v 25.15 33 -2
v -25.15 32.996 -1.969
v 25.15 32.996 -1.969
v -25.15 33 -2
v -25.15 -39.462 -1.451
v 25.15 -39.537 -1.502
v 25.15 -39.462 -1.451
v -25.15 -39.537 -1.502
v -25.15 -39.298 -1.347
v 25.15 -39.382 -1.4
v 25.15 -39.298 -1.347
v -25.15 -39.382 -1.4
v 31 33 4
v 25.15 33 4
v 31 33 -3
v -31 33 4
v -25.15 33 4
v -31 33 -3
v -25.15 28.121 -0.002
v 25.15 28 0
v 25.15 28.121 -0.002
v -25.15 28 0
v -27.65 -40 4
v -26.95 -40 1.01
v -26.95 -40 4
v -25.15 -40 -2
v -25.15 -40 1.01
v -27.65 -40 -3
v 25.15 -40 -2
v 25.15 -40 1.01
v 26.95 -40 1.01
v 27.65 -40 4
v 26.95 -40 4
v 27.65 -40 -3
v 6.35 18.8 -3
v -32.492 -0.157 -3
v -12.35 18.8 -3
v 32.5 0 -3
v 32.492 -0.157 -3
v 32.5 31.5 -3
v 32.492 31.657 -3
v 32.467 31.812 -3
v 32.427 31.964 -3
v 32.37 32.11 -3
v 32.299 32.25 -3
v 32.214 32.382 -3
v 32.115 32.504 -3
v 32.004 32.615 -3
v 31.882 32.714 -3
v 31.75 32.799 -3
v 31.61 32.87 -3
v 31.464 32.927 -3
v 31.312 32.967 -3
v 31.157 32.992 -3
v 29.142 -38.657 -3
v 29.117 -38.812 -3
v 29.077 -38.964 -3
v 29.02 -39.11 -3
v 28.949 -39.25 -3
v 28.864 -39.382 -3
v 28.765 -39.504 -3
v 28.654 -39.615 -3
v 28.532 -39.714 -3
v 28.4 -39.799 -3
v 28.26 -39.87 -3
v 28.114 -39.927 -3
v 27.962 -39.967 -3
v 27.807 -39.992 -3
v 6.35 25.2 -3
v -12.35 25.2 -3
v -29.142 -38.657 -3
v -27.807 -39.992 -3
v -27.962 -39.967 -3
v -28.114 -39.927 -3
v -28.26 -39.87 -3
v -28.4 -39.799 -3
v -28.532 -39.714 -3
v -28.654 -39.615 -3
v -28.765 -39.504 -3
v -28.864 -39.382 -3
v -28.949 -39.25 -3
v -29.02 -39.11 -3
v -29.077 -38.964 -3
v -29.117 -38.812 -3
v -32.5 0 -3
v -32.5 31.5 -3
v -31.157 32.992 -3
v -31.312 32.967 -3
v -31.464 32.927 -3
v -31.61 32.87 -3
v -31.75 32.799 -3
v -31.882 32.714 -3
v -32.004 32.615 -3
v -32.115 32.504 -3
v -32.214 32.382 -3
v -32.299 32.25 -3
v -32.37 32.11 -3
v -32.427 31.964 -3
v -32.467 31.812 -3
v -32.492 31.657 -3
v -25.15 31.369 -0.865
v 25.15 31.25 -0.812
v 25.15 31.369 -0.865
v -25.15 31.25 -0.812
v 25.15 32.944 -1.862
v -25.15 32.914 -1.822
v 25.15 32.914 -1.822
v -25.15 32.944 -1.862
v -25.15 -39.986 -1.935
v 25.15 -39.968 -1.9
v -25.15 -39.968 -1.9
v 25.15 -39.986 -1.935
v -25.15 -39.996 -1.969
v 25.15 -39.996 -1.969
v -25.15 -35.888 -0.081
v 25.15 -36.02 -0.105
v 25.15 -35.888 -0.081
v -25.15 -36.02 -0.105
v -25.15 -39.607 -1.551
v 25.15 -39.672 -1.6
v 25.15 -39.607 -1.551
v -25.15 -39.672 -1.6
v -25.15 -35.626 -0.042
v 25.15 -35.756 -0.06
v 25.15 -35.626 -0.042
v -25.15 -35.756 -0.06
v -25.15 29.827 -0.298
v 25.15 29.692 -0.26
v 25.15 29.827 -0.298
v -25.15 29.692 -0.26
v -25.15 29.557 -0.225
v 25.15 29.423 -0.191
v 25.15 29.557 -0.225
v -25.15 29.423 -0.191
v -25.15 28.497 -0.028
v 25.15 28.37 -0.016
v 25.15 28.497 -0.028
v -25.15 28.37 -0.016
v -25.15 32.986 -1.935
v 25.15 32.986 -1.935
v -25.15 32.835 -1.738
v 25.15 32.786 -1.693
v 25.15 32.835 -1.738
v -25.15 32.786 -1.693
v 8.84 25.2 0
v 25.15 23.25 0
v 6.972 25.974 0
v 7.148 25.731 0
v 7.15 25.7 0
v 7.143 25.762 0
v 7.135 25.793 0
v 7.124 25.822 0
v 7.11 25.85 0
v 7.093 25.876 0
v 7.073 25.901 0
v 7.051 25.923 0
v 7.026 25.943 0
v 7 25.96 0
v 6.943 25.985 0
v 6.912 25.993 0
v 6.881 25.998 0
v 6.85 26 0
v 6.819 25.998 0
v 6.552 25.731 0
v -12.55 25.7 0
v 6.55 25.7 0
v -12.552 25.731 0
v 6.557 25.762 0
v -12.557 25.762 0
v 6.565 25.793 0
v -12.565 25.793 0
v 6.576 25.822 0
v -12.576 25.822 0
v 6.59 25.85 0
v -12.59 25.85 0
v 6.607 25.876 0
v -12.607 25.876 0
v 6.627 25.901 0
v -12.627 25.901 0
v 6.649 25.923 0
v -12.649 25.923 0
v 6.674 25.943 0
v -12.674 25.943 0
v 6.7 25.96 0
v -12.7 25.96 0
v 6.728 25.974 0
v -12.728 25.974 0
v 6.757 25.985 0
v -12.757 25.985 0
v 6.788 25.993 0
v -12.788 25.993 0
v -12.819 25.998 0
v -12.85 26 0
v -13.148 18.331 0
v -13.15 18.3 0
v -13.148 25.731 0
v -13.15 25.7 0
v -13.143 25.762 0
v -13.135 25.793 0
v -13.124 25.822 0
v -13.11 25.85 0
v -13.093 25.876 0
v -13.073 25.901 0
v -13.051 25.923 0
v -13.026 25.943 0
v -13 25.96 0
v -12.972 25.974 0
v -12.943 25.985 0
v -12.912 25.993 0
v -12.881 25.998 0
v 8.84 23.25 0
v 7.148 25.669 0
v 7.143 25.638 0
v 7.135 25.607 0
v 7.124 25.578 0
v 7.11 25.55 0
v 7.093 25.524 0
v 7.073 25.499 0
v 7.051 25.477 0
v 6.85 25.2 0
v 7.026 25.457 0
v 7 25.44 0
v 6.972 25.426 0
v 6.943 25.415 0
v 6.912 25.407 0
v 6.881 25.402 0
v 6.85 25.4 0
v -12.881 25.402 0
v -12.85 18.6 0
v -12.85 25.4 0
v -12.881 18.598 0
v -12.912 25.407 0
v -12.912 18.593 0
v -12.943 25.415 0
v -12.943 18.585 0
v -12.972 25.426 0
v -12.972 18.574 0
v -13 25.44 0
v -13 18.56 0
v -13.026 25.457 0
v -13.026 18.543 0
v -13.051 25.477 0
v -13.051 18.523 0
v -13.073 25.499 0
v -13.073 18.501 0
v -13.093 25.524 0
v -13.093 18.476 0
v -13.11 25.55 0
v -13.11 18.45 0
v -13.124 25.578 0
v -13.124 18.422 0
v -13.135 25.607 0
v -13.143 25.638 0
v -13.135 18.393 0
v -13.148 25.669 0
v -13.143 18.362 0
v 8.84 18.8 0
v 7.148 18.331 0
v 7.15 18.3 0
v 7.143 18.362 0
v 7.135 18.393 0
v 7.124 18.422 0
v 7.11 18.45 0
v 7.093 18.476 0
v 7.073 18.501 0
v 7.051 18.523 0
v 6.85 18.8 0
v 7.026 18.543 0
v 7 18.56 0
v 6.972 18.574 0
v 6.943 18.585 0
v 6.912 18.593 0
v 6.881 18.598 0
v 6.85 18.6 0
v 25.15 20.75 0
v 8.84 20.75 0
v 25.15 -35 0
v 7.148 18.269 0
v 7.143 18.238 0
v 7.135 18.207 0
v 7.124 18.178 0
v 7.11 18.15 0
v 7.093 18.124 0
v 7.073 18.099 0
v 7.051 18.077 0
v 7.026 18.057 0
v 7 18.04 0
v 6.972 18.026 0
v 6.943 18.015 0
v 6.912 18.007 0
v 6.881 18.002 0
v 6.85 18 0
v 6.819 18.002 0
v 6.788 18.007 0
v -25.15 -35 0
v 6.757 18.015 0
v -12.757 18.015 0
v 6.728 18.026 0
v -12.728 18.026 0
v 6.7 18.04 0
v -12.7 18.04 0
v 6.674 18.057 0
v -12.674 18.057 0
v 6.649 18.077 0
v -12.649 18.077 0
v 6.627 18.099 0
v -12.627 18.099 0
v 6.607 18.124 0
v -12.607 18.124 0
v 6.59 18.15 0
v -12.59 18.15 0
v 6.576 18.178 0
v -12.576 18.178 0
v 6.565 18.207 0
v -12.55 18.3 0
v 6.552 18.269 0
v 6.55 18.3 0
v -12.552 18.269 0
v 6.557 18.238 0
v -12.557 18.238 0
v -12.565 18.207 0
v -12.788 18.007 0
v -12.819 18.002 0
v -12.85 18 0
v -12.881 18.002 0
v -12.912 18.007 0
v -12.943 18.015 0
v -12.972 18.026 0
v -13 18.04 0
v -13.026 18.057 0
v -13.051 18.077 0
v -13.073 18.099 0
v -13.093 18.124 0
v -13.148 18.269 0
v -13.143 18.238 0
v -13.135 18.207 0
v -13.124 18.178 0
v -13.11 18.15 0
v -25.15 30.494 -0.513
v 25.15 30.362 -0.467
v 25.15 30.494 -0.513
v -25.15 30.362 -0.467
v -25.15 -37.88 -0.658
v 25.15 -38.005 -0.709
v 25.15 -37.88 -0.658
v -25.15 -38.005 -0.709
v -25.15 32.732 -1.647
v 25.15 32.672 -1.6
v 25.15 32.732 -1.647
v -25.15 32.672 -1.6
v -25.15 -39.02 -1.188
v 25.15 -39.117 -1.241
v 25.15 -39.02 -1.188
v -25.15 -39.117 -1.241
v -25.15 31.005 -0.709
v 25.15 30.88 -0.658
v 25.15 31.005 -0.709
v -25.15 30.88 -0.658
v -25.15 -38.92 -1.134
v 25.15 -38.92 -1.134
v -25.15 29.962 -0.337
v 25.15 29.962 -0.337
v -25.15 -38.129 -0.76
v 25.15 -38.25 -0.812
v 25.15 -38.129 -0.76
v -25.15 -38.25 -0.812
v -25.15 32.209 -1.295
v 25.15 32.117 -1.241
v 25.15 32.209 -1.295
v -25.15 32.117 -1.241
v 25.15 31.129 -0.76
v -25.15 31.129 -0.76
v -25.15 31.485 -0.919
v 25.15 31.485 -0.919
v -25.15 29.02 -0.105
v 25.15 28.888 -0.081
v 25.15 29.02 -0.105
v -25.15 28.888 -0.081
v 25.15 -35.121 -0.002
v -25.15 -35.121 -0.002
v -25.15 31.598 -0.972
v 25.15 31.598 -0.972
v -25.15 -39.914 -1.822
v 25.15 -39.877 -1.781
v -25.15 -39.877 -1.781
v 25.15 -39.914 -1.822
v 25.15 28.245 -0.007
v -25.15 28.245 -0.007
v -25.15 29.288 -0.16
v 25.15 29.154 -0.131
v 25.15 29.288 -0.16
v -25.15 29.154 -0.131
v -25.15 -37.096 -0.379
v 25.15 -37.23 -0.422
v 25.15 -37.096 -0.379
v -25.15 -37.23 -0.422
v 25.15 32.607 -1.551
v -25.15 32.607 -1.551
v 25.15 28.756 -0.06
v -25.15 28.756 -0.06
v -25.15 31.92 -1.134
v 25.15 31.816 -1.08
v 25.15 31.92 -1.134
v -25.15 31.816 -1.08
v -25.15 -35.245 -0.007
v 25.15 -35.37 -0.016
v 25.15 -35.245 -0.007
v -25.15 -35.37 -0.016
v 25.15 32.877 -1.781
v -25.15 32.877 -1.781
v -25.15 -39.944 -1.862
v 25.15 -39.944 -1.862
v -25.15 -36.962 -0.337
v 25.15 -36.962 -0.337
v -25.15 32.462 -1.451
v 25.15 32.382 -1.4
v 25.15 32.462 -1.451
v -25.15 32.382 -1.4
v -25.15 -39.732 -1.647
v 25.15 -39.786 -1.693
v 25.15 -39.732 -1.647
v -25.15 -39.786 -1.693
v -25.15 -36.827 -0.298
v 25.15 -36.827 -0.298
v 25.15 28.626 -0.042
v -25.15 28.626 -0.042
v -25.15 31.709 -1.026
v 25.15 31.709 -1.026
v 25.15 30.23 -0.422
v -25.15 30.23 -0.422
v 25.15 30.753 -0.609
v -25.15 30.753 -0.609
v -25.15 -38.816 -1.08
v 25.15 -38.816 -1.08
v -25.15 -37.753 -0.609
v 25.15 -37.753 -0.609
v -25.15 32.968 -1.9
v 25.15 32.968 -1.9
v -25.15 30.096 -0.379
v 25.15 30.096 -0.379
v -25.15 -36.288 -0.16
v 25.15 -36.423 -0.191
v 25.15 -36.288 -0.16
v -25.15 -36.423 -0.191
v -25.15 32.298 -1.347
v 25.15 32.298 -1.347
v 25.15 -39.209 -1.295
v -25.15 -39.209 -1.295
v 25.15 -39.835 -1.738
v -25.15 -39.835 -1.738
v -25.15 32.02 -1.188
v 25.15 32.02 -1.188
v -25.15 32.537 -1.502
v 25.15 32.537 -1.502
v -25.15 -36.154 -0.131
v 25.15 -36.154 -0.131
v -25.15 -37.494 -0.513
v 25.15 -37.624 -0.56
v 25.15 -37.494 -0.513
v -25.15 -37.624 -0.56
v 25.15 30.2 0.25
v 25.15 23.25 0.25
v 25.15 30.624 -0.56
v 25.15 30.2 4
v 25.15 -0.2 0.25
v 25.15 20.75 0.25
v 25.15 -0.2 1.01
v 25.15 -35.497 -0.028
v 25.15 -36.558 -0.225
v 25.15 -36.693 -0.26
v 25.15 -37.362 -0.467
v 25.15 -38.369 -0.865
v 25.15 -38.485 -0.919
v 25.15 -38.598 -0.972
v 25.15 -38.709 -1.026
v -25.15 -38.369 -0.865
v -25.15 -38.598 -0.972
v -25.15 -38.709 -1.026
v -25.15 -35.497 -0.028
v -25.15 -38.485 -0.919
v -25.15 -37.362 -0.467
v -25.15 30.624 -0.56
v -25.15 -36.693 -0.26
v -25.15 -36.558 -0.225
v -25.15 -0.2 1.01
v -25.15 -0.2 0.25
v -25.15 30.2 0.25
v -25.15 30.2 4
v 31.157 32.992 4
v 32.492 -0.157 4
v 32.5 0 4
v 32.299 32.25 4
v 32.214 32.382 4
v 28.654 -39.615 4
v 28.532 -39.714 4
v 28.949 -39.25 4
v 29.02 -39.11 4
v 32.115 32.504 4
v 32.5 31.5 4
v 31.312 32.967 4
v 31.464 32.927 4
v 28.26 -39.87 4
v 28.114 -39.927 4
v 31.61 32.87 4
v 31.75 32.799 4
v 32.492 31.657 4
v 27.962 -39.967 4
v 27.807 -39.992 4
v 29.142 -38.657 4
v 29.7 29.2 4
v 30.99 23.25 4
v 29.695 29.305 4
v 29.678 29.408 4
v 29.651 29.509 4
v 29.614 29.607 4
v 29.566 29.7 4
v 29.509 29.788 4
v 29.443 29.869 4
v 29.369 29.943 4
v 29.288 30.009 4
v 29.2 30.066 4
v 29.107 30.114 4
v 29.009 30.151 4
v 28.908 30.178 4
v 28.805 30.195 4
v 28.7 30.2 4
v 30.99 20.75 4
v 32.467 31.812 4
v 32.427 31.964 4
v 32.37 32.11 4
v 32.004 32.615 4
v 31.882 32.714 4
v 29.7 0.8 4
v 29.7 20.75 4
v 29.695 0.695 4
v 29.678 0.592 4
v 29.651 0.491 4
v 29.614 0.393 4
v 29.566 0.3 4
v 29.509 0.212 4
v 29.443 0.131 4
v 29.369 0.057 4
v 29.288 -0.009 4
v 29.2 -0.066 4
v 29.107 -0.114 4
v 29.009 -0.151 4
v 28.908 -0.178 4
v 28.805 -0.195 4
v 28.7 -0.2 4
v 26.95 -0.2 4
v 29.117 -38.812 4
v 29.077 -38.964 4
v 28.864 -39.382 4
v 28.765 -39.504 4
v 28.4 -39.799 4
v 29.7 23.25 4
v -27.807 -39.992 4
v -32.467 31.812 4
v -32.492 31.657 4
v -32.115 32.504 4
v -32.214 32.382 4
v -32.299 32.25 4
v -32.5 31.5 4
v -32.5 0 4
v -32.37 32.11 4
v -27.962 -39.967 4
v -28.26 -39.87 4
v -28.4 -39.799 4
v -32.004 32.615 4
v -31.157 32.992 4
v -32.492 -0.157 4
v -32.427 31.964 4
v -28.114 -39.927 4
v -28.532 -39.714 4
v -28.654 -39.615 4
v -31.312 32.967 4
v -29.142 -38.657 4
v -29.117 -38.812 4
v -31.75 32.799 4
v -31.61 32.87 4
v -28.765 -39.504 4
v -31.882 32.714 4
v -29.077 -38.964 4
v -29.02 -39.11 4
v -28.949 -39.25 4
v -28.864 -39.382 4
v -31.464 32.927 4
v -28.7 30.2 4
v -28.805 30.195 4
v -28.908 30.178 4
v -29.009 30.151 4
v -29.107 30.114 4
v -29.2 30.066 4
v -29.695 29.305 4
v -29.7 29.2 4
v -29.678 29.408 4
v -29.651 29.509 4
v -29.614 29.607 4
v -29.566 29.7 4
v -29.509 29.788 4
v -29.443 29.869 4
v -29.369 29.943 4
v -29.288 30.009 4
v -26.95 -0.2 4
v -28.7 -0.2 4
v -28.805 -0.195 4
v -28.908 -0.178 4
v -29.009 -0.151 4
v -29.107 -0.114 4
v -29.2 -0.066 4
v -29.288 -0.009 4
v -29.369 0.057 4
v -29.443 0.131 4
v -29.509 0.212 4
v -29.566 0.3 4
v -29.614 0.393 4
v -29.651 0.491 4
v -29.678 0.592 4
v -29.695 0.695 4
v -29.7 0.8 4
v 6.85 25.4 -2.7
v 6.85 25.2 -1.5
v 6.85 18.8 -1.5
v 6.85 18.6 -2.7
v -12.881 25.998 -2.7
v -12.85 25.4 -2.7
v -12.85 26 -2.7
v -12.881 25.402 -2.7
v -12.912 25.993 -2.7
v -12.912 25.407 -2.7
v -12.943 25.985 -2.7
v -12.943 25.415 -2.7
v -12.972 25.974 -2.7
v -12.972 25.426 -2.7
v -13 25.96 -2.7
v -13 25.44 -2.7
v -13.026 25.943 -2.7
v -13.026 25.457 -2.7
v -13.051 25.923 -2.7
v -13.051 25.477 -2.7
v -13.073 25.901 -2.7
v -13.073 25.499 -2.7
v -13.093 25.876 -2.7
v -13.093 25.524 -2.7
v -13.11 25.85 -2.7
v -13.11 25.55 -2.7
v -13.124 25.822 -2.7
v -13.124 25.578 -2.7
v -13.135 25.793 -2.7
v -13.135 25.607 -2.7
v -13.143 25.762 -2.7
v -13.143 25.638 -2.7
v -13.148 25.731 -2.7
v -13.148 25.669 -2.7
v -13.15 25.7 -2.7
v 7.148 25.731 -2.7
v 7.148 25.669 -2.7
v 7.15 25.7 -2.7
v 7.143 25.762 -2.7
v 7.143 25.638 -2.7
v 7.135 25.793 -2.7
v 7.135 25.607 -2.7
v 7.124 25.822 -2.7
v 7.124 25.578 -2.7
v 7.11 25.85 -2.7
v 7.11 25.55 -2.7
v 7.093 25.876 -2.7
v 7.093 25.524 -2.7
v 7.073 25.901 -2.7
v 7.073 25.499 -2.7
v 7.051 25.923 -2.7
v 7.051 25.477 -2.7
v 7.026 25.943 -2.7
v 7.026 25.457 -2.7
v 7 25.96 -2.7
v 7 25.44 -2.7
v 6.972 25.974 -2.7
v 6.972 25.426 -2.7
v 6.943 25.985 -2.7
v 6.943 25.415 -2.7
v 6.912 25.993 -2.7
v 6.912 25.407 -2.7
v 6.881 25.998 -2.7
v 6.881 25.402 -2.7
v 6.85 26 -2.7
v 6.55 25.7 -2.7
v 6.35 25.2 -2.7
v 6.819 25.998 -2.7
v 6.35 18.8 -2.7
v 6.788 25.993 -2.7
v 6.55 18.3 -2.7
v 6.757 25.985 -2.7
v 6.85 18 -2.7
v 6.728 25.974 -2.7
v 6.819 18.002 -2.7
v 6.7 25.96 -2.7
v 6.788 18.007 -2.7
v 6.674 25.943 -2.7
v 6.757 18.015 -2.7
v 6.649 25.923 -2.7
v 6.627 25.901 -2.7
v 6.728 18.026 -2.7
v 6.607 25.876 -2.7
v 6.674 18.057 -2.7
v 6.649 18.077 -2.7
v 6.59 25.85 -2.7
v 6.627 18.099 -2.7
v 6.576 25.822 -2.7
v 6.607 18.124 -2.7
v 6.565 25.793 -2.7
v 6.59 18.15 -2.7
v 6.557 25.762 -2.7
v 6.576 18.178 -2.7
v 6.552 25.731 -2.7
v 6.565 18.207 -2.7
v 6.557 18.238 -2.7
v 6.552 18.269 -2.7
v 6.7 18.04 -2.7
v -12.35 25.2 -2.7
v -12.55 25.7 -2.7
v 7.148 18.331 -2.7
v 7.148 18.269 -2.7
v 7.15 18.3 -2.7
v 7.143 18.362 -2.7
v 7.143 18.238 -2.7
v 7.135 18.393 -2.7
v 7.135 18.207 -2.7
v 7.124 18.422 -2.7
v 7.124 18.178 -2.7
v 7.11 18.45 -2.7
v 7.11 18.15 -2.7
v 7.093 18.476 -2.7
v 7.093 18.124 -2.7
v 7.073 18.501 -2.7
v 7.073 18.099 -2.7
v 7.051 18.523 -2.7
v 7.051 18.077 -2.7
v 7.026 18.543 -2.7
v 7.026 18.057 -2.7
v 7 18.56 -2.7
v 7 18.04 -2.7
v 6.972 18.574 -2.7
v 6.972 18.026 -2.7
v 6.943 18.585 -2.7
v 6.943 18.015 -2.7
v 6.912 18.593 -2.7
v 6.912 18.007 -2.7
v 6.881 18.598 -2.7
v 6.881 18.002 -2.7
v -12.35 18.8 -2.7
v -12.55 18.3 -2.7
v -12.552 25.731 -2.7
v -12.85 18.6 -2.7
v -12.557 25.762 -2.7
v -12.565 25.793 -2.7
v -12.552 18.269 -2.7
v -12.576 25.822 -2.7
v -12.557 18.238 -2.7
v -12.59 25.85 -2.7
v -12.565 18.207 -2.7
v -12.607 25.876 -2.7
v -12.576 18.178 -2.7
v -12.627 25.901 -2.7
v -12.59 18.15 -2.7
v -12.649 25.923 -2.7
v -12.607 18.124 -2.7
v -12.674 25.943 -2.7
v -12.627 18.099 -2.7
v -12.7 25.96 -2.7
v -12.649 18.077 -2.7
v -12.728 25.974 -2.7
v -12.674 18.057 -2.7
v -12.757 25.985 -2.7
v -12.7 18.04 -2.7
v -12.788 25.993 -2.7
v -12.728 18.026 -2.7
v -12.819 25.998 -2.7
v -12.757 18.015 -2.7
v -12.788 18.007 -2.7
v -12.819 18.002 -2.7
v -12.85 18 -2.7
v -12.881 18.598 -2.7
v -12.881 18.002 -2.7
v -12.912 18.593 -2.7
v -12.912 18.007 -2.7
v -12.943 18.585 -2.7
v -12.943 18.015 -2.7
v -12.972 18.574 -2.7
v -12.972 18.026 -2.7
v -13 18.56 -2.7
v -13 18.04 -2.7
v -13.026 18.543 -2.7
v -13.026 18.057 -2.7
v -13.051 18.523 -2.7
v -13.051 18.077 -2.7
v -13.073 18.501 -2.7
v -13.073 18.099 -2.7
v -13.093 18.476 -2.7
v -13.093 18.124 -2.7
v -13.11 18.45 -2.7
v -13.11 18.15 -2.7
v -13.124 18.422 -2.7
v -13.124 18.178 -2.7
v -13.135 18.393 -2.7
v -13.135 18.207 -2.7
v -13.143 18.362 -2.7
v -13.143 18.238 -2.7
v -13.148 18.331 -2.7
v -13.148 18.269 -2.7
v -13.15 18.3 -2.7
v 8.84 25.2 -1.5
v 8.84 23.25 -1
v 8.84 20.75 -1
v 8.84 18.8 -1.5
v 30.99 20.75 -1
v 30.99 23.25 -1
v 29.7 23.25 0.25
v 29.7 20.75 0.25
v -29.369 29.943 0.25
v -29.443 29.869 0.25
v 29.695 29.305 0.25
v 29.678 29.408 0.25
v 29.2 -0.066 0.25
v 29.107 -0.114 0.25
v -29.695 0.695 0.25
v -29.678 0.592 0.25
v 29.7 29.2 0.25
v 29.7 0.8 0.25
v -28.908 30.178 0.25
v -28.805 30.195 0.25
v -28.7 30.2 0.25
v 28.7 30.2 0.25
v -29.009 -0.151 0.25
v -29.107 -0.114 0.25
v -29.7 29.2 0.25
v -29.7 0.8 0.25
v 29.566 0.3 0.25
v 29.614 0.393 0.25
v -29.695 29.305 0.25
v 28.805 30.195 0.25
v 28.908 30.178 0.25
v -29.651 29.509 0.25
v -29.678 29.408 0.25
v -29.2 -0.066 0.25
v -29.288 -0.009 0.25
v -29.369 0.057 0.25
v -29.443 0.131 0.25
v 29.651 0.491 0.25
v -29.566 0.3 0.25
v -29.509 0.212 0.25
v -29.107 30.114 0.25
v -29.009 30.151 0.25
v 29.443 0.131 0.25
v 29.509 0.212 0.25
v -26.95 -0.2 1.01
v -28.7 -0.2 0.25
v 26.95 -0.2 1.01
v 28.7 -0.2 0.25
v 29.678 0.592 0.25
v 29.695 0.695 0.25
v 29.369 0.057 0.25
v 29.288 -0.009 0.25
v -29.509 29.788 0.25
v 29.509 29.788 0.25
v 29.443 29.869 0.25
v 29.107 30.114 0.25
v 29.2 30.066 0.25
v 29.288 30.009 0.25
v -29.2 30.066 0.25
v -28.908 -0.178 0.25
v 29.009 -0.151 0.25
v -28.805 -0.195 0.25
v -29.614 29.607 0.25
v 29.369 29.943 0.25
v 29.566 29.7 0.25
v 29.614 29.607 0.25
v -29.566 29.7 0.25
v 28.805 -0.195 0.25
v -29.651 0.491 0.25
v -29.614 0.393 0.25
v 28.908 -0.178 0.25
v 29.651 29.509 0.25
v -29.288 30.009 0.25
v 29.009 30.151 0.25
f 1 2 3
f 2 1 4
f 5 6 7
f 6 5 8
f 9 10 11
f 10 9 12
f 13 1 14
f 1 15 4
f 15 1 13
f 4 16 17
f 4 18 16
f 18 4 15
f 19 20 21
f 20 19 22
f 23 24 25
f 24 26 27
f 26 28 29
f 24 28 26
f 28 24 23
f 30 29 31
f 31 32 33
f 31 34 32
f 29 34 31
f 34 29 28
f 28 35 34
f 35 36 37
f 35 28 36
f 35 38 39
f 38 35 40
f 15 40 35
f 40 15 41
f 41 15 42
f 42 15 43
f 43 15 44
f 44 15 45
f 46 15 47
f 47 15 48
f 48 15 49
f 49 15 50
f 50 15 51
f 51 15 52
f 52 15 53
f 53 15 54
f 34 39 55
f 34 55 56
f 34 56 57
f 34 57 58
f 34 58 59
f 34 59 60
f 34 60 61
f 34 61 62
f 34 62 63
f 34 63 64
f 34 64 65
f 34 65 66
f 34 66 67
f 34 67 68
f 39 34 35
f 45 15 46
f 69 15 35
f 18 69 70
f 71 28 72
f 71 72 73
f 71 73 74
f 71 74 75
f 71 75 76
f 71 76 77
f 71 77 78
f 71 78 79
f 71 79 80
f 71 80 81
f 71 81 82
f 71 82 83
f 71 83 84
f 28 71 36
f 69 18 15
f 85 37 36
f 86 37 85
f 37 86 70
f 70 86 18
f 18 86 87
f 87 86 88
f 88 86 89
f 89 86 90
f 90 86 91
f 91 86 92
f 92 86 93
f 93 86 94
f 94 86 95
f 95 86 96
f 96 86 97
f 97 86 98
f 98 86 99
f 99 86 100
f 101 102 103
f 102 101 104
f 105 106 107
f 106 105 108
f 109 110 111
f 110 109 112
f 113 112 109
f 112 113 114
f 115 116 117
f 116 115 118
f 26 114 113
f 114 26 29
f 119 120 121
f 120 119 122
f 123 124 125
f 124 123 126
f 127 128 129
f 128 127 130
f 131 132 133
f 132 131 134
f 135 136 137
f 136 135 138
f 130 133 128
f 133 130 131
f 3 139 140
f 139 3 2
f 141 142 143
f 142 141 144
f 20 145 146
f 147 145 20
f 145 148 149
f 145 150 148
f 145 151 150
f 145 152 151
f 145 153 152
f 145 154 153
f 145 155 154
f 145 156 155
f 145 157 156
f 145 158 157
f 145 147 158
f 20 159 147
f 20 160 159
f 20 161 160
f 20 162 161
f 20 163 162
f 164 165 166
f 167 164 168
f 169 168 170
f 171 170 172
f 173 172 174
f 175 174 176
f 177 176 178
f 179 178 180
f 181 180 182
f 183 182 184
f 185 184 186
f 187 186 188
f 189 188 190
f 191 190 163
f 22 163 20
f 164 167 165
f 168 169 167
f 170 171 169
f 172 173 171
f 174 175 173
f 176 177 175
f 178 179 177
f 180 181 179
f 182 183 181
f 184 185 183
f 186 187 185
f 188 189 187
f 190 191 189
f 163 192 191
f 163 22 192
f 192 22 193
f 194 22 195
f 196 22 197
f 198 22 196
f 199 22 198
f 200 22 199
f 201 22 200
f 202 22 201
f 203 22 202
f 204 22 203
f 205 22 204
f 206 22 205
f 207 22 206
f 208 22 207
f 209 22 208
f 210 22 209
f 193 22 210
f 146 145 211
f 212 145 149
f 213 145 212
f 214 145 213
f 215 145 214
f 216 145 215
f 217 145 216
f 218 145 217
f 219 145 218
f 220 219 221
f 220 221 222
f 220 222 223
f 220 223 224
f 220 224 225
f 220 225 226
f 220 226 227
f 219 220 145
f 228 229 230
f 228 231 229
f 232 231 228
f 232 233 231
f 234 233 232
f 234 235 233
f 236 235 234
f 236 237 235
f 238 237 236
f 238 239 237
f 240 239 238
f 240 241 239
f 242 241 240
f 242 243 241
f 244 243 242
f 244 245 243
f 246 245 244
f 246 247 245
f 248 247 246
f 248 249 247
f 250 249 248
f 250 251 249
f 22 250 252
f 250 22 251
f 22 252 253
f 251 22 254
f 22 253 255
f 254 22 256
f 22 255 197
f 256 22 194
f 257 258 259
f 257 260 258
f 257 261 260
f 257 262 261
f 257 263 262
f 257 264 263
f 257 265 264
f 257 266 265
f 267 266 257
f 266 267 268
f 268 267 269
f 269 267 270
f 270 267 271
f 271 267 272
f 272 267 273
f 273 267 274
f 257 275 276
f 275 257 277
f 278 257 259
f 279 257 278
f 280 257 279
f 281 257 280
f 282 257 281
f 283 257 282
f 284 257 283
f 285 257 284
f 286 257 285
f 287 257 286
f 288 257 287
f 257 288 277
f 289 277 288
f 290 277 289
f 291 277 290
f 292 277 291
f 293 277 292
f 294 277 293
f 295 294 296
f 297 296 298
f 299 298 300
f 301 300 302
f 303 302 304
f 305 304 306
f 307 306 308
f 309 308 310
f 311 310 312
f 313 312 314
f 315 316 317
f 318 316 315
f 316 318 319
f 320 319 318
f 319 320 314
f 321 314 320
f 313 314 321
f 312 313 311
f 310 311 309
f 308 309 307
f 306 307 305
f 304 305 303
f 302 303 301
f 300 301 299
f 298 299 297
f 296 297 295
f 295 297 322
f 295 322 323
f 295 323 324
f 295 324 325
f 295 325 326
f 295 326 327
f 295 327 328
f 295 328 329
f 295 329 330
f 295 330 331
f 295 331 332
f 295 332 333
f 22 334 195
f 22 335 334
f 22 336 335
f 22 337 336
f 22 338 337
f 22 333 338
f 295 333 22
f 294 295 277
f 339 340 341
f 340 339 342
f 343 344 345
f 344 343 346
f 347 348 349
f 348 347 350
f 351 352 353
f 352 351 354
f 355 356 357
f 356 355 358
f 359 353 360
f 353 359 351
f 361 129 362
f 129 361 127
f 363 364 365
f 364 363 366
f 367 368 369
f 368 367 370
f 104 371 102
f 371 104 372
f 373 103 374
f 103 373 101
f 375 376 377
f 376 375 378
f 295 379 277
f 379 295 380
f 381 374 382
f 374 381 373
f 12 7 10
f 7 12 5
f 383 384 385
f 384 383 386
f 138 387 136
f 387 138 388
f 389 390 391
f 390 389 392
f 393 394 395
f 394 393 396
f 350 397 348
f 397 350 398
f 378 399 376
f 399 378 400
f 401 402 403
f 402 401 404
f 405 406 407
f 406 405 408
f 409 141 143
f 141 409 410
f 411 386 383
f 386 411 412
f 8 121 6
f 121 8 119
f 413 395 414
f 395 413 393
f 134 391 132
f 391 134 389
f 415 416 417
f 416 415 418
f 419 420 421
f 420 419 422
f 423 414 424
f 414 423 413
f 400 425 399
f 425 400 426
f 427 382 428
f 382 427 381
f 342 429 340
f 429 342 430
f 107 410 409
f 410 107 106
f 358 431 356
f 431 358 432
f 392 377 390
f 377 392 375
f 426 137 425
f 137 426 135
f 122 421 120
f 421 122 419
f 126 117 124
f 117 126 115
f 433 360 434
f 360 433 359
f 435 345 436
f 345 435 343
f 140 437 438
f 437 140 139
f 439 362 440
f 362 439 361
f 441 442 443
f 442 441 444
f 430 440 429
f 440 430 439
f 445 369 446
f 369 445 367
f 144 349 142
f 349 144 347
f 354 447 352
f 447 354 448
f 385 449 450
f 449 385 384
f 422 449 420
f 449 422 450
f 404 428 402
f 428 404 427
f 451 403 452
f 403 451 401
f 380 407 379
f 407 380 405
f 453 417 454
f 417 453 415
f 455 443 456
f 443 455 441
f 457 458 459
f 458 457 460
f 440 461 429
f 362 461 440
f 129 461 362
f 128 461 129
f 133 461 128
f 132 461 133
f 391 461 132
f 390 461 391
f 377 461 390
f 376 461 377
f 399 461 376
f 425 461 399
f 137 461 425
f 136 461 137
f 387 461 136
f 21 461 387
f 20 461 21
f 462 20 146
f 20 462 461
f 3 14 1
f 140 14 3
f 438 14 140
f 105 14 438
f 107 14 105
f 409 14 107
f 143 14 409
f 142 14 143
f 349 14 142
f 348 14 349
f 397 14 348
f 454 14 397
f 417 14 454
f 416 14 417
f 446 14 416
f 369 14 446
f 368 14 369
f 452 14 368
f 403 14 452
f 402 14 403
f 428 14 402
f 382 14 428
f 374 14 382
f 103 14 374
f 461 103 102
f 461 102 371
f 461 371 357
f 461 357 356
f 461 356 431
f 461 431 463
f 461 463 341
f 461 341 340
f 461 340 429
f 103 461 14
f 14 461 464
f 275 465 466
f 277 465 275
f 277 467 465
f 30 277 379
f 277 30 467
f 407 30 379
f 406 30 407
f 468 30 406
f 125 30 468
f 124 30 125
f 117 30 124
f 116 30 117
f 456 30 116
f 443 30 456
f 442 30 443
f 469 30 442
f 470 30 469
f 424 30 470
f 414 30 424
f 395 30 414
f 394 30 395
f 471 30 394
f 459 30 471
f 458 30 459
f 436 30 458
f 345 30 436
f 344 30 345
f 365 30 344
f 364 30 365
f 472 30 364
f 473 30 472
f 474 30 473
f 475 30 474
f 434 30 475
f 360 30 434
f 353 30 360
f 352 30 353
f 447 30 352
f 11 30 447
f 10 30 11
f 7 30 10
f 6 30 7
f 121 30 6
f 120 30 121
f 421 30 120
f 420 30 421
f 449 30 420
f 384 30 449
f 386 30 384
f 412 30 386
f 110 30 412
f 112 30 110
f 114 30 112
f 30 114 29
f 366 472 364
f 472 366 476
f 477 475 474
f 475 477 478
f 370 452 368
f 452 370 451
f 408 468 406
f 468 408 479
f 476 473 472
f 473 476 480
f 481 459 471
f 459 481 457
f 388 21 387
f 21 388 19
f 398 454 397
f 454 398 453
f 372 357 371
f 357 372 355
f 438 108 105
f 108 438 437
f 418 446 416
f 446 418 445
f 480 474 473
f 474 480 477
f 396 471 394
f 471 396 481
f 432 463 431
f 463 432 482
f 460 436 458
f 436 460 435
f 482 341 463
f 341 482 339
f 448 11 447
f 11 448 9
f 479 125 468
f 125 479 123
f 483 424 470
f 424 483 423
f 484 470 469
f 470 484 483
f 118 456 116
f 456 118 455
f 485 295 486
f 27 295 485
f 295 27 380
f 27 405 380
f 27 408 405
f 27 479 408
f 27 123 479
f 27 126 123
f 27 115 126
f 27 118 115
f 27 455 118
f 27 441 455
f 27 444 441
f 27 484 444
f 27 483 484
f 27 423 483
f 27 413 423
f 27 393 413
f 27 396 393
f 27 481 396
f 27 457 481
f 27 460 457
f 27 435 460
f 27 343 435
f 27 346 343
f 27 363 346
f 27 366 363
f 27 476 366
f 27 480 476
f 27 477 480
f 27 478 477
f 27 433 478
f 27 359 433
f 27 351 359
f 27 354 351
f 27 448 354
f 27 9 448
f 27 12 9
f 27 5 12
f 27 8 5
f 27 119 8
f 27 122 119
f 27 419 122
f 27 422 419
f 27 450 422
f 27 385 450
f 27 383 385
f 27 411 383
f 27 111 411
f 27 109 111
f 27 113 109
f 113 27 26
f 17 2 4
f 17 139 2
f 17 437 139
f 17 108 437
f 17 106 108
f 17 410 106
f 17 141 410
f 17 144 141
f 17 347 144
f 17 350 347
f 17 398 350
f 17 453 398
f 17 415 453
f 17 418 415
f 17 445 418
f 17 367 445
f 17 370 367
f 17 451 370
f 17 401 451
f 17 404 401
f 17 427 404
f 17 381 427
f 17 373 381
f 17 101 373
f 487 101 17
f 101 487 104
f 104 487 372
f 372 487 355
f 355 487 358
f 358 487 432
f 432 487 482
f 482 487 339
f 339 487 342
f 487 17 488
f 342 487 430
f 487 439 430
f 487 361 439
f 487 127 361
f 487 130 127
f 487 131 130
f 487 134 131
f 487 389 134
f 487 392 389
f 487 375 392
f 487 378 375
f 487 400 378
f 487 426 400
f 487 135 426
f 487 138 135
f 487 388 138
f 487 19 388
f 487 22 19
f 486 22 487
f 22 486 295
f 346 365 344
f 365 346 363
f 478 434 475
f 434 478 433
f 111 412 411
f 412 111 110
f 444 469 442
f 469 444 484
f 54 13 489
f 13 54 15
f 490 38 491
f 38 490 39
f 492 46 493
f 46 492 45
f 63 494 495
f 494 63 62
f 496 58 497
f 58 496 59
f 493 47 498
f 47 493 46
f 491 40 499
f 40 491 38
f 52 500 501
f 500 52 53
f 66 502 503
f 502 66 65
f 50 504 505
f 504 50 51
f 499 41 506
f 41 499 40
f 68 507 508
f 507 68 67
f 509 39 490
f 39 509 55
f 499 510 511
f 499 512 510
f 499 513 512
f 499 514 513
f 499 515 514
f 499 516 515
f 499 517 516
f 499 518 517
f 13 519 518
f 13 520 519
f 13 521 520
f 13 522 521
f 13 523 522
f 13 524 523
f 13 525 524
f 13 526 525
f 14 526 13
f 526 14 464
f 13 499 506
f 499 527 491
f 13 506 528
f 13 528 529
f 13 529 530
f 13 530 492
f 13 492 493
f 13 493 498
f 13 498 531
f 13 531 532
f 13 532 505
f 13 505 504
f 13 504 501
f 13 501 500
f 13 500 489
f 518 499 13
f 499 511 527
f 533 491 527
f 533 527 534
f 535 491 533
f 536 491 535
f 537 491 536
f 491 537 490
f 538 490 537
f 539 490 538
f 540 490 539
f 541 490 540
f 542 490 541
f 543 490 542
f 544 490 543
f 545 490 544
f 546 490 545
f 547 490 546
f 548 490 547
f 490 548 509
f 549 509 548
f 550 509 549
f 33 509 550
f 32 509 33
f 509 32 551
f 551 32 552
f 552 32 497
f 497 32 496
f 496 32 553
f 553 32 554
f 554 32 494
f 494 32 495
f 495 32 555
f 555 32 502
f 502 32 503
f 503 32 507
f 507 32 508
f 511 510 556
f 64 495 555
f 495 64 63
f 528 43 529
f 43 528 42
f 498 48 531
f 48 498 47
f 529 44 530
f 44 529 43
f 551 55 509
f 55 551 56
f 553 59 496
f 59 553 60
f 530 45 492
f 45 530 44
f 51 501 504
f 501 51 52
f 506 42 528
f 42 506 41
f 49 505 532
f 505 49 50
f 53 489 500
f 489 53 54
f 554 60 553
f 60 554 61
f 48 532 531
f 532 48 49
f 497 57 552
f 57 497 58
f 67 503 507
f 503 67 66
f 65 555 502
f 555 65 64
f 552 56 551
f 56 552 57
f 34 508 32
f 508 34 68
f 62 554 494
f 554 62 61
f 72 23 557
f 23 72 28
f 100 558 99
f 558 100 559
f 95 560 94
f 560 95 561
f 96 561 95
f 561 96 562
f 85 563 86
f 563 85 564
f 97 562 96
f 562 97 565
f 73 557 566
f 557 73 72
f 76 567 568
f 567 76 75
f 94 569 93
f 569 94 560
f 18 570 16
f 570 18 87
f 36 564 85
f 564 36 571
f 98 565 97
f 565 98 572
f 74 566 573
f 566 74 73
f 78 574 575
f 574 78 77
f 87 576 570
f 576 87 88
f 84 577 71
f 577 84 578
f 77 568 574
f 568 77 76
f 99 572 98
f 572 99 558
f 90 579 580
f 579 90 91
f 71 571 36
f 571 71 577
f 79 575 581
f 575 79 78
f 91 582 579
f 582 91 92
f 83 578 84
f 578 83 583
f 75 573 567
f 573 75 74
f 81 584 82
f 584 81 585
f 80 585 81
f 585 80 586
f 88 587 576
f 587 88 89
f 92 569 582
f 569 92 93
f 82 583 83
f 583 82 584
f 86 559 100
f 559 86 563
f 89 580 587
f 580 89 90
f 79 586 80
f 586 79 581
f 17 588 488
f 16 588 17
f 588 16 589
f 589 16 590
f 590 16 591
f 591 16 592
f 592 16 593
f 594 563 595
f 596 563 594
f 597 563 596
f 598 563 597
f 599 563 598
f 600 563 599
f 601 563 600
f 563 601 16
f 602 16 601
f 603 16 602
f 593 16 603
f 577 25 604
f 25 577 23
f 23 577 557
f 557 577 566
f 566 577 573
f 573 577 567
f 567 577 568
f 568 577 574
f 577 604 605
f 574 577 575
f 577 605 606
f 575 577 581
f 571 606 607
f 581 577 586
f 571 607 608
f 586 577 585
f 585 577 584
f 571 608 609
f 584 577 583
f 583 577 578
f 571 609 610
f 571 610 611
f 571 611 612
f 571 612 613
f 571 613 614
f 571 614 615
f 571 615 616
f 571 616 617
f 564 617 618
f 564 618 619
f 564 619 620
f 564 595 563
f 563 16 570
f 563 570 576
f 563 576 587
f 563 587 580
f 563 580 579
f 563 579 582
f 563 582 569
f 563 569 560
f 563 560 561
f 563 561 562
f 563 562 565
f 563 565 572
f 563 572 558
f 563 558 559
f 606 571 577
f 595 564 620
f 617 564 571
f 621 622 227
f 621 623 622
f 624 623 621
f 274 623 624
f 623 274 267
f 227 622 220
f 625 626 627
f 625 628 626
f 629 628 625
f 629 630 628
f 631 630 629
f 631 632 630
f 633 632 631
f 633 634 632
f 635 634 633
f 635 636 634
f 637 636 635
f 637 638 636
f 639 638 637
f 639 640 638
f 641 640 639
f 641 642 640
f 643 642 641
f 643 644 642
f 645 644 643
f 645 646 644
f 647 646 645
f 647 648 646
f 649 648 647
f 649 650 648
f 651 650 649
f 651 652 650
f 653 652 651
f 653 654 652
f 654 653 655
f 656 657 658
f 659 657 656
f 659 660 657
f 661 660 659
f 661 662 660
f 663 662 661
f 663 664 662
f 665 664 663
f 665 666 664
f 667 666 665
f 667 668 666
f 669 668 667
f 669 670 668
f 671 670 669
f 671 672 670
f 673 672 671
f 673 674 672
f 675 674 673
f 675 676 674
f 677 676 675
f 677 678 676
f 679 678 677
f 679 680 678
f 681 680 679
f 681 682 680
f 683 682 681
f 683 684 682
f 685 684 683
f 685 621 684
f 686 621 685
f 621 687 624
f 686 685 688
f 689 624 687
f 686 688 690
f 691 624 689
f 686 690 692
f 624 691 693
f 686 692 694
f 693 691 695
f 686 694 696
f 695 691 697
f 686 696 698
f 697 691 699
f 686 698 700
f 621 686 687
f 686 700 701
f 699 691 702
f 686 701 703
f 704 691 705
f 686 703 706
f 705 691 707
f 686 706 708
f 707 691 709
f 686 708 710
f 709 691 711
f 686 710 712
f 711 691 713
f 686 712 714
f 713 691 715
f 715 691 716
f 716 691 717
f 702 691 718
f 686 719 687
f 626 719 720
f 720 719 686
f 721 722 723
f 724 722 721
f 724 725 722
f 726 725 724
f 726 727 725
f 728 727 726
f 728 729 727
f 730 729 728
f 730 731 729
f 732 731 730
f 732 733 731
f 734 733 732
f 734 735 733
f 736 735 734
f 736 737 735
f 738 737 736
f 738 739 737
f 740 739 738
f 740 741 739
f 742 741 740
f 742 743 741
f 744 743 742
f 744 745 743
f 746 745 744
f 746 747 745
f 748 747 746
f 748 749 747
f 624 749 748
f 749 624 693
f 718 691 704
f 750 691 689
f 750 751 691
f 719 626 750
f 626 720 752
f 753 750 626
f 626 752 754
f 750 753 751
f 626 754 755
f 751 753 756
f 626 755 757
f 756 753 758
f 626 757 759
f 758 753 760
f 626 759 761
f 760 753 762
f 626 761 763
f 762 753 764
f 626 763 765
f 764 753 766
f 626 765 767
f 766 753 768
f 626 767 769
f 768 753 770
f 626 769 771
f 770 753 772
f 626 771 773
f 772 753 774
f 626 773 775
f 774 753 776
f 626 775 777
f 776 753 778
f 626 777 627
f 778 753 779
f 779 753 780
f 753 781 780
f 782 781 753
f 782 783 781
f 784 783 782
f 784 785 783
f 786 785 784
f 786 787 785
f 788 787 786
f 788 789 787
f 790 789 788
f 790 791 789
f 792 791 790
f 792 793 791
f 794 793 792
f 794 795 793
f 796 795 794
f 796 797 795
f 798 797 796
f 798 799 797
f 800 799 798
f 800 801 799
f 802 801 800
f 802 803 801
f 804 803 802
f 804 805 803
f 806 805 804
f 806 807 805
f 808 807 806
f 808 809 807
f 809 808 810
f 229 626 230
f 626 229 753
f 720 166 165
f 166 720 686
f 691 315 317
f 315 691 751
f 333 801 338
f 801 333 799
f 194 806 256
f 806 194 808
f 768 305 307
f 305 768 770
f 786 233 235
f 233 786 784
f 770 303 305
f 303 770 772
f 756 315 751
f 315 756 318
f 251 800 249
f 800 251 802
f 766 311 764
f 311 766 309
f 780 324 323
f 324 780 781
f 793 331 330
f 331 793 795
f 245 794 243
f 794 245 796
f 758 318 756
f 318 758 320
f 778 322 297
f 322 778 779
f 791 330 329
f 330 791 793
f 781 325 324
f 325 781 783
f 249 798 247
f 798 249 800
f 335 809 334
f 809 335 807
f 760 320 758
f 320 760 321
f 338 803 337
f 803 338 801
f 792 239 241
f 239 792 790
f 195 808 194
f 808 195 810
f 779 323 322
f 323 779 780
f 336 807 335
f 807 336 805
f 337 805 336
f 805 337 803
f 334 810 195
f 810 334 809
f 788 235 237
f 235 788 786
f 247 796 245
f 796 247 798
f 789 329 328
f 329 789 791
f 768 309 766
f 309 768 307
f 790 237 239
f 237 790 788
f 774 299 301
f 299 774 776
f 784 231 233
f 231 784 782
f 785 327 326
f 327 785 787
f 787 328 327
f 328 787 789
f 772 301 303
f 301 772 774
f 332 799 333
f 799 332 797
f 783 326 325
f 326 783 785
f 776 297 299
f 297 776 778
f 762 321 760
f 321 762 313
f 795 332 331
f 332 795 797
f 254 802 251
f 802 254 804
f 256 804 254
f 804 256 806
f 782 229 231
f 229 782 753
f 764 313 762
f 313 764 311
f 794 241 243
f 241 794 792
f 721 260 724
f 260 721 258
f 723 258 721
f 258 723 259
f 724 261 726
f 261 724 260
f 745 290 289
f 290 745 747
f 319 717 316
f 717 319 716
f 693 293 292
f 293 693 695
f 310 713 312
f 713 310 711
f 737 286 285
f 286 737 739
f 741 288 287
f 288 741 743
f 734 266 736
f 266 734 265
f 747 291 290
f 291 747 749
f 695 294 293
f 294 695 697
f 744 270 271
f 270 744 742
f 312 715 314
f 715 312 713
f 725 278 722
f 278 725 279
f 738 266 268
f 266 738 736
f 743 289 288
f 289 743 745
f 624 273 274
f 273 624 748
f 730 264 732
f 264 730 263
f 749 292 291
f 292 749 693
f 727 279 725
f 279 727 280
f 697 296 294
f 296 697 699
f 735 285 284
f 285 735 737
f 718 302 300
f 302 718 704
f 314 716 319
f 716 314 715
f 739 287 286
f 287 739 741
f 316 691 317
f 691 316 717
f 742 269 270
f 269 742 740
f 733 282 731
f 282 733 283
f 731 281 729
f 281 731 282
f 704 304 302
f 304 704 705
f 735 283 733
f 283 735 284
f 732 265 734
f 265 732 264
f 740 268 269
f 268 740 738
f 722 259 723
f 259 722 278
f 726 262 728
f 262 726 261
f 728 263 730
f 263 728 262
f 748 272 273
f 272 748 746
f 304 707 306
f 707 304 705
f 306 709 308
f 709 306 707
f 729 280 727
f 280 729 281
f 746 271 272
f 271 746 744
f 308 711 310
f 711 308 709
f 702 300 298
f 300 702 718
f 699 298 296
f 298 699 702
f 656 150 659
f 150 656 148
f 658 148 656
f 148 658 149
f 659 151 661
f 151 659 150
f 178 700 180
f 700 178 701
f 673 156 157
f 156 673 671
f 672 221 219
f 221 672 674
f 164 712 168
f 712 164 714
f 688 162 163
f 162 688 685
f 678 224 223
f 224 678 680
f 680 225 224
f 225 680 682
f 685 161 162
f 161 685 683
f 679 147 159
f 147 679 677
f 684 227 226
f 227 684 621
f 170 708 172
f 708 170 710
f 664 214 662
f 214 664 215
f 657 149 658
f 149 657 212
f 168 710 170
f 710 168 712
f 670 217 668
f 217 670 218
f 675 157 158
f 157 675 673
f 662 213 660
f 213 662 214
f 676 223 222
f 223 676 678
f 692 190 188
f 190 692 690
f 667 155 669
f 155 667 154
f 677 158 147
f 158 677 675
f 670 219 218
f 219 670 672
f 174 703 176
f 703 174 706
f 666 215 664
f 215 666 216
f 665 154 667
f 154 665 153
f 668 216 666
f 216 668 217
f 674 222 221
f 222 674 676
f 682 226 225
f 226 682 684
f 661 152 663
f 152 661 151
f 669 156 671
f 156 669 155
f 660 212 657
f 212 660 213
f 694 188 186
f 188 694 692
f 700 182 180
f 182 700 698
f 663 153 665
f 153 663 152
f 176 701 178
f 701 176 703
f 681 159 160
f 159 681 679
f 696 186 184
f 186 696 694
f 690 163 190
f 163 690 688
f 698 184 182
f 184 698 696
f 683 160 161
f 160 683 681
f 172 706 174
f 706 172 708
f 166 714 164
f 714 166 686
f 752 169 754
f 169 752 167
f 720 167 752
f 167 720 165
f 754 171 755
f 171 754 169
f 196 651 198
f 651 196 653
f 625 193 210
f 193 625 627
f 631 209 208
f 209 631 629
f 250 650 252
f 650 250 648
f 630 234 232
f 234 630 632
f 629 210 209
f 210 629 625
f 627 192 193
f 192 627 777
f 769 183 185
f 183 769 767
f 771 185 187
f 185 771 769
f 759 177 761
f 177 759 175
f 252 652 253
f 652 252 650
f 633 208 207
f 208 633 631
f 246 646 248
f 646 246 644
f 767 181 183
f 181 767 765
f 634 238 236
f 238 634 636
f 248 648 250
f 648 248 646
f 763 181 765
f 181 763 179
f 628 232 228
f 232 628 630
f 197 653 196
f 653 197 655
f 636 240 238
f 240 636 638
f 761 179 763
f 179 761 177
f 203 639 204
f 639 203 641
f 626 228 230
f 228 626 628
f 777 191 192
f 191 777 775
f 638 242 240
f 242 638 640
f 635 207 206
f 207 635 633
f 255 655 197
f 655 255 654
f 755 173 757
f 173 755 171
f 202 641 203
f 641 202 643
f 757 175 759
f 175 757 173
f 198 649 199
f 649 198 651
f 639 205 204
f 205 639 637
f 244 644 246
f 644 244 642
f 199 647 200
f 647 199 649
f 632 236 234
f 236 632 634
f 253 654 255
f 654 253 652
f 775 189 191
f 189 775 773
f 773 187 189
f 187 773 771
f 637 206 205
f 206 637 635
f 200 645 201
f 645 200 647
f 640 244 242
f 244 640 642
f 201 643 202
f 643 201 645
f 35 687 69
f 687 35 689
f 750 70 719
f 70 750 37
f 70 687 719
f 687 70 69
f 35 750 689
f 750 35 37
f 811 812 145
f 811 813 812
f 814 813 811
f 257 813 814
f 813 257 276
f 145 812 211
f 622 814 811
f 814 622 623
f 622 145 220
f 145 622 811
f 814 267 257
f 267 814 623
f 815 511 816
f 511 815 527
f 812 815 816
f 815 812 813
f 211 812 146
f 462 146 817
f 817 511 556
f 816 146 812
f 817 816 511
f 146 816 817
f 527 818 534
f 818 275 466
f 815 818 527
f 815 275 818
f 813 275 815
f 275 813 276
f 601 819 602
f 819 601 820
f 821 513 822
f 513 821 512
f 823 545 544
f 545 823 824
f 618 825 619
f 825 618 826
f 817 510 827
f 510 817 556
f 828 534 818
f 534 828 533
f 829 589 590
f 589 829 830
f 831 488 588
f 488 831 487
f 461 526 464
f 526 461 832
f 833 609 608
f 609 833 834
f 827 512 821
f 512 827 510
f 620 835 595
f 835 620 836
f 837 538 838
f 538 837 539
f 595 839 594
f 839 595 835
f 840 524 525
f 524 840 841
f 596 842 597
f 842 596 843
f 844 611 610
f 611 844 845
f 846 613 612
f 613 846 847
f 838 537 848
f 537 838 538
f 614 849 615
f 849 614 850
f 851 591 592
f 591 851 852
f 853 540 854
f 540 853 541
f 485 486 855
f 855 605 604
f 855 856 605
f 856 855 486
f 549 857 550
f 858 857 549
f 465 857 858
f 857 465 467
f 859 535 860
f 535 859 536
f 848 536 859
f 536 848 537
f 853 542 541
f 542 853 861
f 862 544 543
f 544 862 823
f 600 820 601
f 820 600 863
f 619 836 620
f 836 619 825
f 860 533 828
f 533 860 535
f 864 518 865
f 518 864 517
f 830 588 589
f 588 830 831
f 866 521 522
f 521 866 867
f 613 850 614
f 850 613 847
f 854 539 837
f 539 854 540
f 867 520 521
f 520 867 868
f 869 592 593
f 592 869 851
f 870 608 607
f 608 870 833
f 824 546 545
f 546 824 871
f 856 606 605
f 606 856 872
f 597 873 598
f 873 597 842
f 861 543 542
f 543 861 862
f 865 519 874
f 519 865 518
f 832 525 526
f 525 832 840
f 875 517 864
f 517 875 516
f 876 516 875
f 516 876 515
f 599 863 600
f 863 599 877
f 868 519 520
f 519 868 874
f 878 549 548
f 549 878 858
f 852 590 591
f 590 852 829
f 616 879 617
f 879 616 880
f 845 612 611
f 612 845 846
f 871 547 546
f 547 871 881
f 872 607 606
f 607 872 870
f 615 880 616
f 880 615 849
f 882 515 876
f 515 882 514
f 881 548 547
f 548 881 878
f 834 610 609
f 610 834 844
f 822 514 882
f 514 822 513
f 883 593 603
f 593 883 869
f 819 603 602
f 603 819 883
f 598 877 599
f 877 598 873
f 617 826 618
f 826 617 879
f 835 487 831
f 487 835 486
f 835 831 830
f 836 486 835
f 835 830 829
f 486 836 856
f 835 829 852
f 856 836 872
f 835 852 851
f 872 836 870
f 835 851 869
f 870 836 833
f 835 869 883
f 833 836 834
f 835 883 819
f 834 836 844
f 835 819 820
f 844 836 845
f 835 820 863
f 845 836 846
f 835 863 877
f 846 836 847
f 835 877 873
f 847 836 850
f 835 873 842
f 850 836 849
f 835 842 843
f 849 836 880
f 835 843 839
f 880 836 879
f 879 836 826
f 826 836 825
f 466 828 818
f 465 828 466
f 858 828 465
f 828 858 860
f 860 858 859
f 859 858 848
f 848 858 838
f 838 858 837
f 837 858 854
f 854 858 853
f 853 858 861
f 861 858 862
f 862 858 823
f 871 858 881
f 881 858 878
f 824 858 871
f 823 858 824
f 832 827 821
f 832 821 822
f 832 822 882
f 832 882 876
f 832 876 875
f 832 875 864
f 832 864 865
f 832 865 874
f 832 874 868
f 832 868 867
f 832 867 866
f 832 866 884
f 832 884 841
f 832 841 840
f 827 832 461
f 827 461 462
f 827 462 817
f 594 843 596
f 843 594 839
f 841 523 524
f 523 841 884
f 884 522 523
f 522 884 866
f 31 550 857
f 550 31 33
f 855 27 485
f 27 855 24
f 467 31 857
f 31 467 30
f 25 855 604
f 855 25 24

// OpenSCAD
// file: bezier.scad
$fn=90;
e=0.01;

function _cubic_bazier_point(start, c1, c2, finish, t) =
  let (
    u = 1.0 - t,
    tt = t * t,
    uu = u * u
  )
  (u*uu) * start +
  3.0 * uu * t * c1 +
  3.0 * u * tt * c2 +
  (t*tt) * finish;

function cubic_bezier(start, c1, c2, finish, count=50) =
  [ for (t = [0 : 1/count : 1]) _cubic_bazier_point(start, c1, c2, finish, t) ];

module bezier_polygon(start, c1, c2, finish, count=100, visualize_cp=false) {
  polygon(cubic_bezier(start, c1, c2, finish, count));

  if (visualize_cp) {
    color("red") translate(c1) circle(r=0.2);
    color("green") translate(c2) circle(r=0.2);
  }
}

module viz_controlpoint(col, point, cp) {
  hull() {
    translate(point) circle(r=0.01);
    translate(cp) circle(r=0.01);
  }
  color(col) translate(cp) circle(r=0.1);
}

module viz_vertex(start, c1, c2, finish) {
  viz_controlpoint("red", start, c1);
  viz_controlpoint("green", finish, c2);
}

// One control point per point: Except for the last, they represent
// the first control-point after the point (the second control point is
// dereived from the _next_ segment, but pointing backwards, creating smooth
// curves.
module cubic_spline(points, cps,
		    extrude=-1, count=50,
		    show_controlpoints=false,
		    just_show_polygon=false) {
  effective_cps = (just_show_polygon || !cps) ? points : cps;
  assert(len(points) >= 2, "Need to have at least twp points");
  assert(len(points) == len(effective_cps),
	 "There needs one control point per point");
  second_to_last = len(points) - 1;
  list = [ for (i = [0:1:second_to_last-e])
      each cubic_bezier(points[i],
			effective_cps[i],
			i < second_to_last-1
			? points[i+1]-(effective_cps[i+1] - points[i+1])
			: effective_cps[i+1],
			points[i+1]) ];
  if (extrude > 0) {
    linear_extrude(height=extrude) polygon(list);
  } else {
    polygon(list);
  }

  if (show_controlpoints) {
    for (i = [0:1:second_to_last-e]) {
      viz_vertex(points[i], cps[i],
		 i < second_to_last-1
		 ? points[i+1]-(cps[i+1] - points[i+1])
		 : cps[i+1],
		 points[i+1]);
    }
  }
}

module place_along_curve(start, c1, c2, finish, at_fraction) {
  // Position
  pos = _cubic_bazier_point(start, c1, c2, finish, at_fraction);

  // Angle
  d0  = _cubic_bazier_point(start, c1, c2, finish, at_fraction - 0.01);
  d1  = _cubic_bazier_point(start, c1, c2, finish, at_fraction + 0.01);
  diff = d1 - d0;
  angle = atan2(diff.y, diff.x);

  translate([pos.x, pos.y, 0]) rotate([0, 0, angle]) children();
}


module test1() {
  cubic_spline(points=[  [0, 0], [1, 2], [3, 0]  ],
	       cps=[  [-1, 1], [2, 2], [4, 1]    ],
	       show_controlpoints=true);
}

module test2() {
  color("red") bezier_polygon([-1, 0], [0, 1], [3, 1], [2, 0]);
  place_along_curve([-1, 0], [0, 1], [3, 1], [2, 0], $t) {
    translate([-0.5, 0, 0]) cube([1, 1, 1]);
  }
}

test2();
// main file
use <bezier.scad>

$fn=60;
e=0.01;

top_len=59;
window_width=53.9;
window_elevate=1+e;

tape_width=50.3;
tape_thick=0.25;
extra_width=6;

track_thick=3;
acrylic_len=40;
front_frame=2;
illuminator_len=28 + front_frame;

track_len=illuminator_len + acrylic_len + 3;

module rounded_cube(w=20, h=10, thick=1, r=0.5) {
  r=(r <= 0) ? e : r;
  dx=w/2-r;
  dy=h/2-r;
  hull() {
    translate([+dx, -dy, 0]) cylinder(r=r, h=thick);
    translate([+dx, +dy, 0]) cylinder(r=r, h=thick);
    translate([-dx, -dy, 0]) cylinder(r=r, h=thick);
    translate([-dx, +dy, 0]) cylinder(r=r, h=thick);
  }
}

module pocket_cube(c, r=0.3) {
  cube(c);
  cylinder(r=r, h=c[2]);
  translate([c[0], 0, 0]) cylinder(r=r, h=c[2]);
  translate([c[0], c[1], 0]) cylinder(r=r, h=c[2]);
  translate([0, c[1], 0]) cylinder(r=r, h=c[2]);
}

module usb() {
  rotate([0, -90, 0]) hull() {  // USB extension
    cylinder(r=1.65, h=10);
    translate([0, 6, 0]) cylinder(r=1.65, h=10);
  }
}

module rp2040_simple() {
  translate([-50.8/2, 0, 0]) cube([50.8, 23, 4.8]);
  hull() {
    translate([-22, 8.4, 3.1]) usb();  // actual location
    translate([-22, 8.4, 5]) usb();     // punch-out help
  }
}

module rp2040_board(extra=0) {
  render() color("#ff000070") translate([-50.8/2, 0, 0]) {
    cube([50.8, 23, 1.6]);  // board thicken
    if (false) translate([2, 8.4, 3.28]) rotate([0, -90, 0]) hull() {  // USB extension
      cylinder(r=1.65, h=10);
      translate([0, 6, 0]) cylinder(r=1.65, h=10);
    }
    difference() {
      import("Feather-rp2040.stl");
      //translate([6.5, 14, 3]) cube([9, 10, 7]);  // battery connector.
    }
  }
}

module glowxel_pcb() {
  color("#0000ffff") {
    translate([-75.6, 39+14.3, 0]) import("glowxels-small.stl");
    translate([0, 14.4/2-0.2, 0]) color("red") rounded_cube(55.6, 14.4, 3);
  }
}

module encoder_board(w, h) {
  color("purple") {
    translate([-w/2, -h/2, 0]) cube([w, h, 3]);
    translate([-6.3, 0, -1.8]) cylinder(r=2.5, h=2);  // viewport
    translate([w/2-3, -h/2, -2]) cube([3, h, 3]);  // Glue joint
    translate([w/2, -(h-1)/2, 0]) cube([2, h-1, 3]);  // Cable
  }
}

module sensor_locator() {
  translate([-3, 20, 0]) children();
}

module strip_led_light() {
  encoder_board(19.1, 6.8); // IR LED illumination
}

module strip_sensor() {
  w=19.7;
  h=7.4;
  translate([-w/2, -h/2, -2.7]) pocket_cube([w, h, 3]);  // hollow
  // bottom retainer
  translate([-(w-1)/2, -(h-1)/2, -track_thick-e]) cube([w-1, h-1, track_thick]);
  translate([w/2-e, -(h-1)/2, -1.5]) cube([2, h-1, 3]);  // Cable extract
  fudge_len=tape_width/2-1;
  translate([w/2-e, -2.5/2, -1]) cube([fudge_len, 2.5, 6]);  // Cable channel
}

module battery() {
  color("silver") cube([32.5, 25.5, 5.7]);
  translate([0.5, 4, 0]) linear_extrude(height=5.7+e) text("LiPo 3.7V", size=3);
}

module window(punch=0) {
  len=acrylic_len + punch;
  color("#00ff0040") translate([-window_width/2, -len, 0]) {
    cube([window_width, len, 3+punch]);
  }
}

module pcb_arrangement() {
  translate([0, front_frame, 0]) {
    translate([0.3, 0, 0.25]) glowxel_pcb();
    sensor_locator() translate([0, 0, +0.5]) strip_led_light();
    //sensor_locator() translate([0, 0, -tape_thick]) strip_sensor();
    translate([-2.5, 3, 4.5]) {
      rp2040_board();
      color("#ffff0070") rp2040_simple();
      translate([-10, -1, 3]) battery();
    }
  }
}

module track_bottom(l=0, r=track_len, b=-track_thick) {
  turn=b+1;
  cubic_spline(points=[  [l+0, b],   // start edge. +0=sharp edge
			 [l, b+1], [l+5, 0],

			 [r-5, 0], [r, b+1],
			 [r-0, b]
		      ],

	       cps = [   [l, b],
			 [l, turn+0.5], [l+5+2, 0],

			 [r-5+2, 0], [r, turn-0.5],
			 [r, b]
		     ],
	       extrude=tape_width,
	       show_controlpoints=false,
	       just_show_polygon=false);
}

module base_case_bottom(len=top_len, back=illuminator_len, height=2.5, extra=0) {
  translate([0, back/2, 0]) rounded_cube(len+extra, back+extra, height, r=1);
}

module base_case(len=top_len) {
  back=illuminator_len;
  render() translate([0, front_frame, 0]) difference() {
    intersection() {
      union() {
	translate([0, -front_frame, 0]) base_case_bottom(len, back);

	// Center rests
	translate([-20-1, 14.5, 0]) cube([7, 4, 5]);
	translate([+20-7-3, 14.5, 0]) cube([7, 4, 5]);

	// Side holders
	translate([-5, 0, 0]) translate([len/2-5, back-8-2, 0]) cube([5, 8, 8]);
	translate([-len/2, back-13.5-2, 0]) cube([6, 13.5, 8]);
	translate([-len/2, -front_frame, 0]) cube([1.8, illuminator_len, 8]);
	//translate([-len/2, illuminator_len-front_frame-1.5, 0]) cube([len, 1.5, 8]);
      }
      translate([0, -front_frame, 0]) base_case_bottom(len, back, 20);
    }
    translate([0, -front_frame, 0]) pcb_arrangement();
    translate([0, 6.6, -3]) {
      rounded_cube(w=54, h=9, r=2.5, thick=6);  // UV-window
    }
    translate([0, -1, 2.6]) sensor_locator() cube([60, 2, 10]);
  }
}

module ear() {
  cylinder(r=2, h=0.2);
}

module base_case_print() {
  base_case();
}

module side_wall(wall_height=4) {
  r=1.5;
  h=wall_height + track_thick;
  // The wider part for the illuminator.
  extra_wide=(top_len - tape_width)/2;

  hull() {
    translate([0, 0, -track_thick]) cube([e, track_len, h]);

    translate([r+1, r, -track_thick]) cylinder(r=r, h=h);
    translate([r, track_len-r, -track_thick]) cylinder(r=r, h=h);

    translate([r+extra_wide, acrylic_len, -track_thick]) cylinder(r=r, h=h);
    translate([r+extra_wide, track_len-r, -track_thick]) cylinder(r=r, h=h);
  }
}

module track_frame() {
  translate([-tape_width/2, -acrylic_len, 0]) {
    rotate([0, 0, 90]) rotate([90, 0, 0])  track_bottom();
  }
  translate([tape_width/2, -acrylic_len, 0]) side_wall();
  translate([-tape_width/2, -acrylic_len, 0]) scale([-1, 1, 1]) side_wall();
}

module track() {
  difference() {
    track_frame();
    translate([0, 0, tape_thick]) base_case_bottom(height=10, extra=0.4);
    translate([0, 0, window_elevate]) window(punch=1);
    sensor_locator() translate([0, front_frame, 0]) strip_sensor();
  }
}


module assembly() {
  color("yellow") track();
  translate([0, 0, tape_thick]) {
    base_case_print();
    pcb_arrangement();
  }
  translate([0, 0, window_elevate]) window();
}

//assembly();
//base_case_print();
track();
//pcb_arrangement();

//translate([-tape_width/2, 0, 0]) side_wall();
//track2();
//track_bottom();
//track();
//glowxel_pcb();

//translate([0, 0, -3.6]) encoder();
//strip_led_light();
